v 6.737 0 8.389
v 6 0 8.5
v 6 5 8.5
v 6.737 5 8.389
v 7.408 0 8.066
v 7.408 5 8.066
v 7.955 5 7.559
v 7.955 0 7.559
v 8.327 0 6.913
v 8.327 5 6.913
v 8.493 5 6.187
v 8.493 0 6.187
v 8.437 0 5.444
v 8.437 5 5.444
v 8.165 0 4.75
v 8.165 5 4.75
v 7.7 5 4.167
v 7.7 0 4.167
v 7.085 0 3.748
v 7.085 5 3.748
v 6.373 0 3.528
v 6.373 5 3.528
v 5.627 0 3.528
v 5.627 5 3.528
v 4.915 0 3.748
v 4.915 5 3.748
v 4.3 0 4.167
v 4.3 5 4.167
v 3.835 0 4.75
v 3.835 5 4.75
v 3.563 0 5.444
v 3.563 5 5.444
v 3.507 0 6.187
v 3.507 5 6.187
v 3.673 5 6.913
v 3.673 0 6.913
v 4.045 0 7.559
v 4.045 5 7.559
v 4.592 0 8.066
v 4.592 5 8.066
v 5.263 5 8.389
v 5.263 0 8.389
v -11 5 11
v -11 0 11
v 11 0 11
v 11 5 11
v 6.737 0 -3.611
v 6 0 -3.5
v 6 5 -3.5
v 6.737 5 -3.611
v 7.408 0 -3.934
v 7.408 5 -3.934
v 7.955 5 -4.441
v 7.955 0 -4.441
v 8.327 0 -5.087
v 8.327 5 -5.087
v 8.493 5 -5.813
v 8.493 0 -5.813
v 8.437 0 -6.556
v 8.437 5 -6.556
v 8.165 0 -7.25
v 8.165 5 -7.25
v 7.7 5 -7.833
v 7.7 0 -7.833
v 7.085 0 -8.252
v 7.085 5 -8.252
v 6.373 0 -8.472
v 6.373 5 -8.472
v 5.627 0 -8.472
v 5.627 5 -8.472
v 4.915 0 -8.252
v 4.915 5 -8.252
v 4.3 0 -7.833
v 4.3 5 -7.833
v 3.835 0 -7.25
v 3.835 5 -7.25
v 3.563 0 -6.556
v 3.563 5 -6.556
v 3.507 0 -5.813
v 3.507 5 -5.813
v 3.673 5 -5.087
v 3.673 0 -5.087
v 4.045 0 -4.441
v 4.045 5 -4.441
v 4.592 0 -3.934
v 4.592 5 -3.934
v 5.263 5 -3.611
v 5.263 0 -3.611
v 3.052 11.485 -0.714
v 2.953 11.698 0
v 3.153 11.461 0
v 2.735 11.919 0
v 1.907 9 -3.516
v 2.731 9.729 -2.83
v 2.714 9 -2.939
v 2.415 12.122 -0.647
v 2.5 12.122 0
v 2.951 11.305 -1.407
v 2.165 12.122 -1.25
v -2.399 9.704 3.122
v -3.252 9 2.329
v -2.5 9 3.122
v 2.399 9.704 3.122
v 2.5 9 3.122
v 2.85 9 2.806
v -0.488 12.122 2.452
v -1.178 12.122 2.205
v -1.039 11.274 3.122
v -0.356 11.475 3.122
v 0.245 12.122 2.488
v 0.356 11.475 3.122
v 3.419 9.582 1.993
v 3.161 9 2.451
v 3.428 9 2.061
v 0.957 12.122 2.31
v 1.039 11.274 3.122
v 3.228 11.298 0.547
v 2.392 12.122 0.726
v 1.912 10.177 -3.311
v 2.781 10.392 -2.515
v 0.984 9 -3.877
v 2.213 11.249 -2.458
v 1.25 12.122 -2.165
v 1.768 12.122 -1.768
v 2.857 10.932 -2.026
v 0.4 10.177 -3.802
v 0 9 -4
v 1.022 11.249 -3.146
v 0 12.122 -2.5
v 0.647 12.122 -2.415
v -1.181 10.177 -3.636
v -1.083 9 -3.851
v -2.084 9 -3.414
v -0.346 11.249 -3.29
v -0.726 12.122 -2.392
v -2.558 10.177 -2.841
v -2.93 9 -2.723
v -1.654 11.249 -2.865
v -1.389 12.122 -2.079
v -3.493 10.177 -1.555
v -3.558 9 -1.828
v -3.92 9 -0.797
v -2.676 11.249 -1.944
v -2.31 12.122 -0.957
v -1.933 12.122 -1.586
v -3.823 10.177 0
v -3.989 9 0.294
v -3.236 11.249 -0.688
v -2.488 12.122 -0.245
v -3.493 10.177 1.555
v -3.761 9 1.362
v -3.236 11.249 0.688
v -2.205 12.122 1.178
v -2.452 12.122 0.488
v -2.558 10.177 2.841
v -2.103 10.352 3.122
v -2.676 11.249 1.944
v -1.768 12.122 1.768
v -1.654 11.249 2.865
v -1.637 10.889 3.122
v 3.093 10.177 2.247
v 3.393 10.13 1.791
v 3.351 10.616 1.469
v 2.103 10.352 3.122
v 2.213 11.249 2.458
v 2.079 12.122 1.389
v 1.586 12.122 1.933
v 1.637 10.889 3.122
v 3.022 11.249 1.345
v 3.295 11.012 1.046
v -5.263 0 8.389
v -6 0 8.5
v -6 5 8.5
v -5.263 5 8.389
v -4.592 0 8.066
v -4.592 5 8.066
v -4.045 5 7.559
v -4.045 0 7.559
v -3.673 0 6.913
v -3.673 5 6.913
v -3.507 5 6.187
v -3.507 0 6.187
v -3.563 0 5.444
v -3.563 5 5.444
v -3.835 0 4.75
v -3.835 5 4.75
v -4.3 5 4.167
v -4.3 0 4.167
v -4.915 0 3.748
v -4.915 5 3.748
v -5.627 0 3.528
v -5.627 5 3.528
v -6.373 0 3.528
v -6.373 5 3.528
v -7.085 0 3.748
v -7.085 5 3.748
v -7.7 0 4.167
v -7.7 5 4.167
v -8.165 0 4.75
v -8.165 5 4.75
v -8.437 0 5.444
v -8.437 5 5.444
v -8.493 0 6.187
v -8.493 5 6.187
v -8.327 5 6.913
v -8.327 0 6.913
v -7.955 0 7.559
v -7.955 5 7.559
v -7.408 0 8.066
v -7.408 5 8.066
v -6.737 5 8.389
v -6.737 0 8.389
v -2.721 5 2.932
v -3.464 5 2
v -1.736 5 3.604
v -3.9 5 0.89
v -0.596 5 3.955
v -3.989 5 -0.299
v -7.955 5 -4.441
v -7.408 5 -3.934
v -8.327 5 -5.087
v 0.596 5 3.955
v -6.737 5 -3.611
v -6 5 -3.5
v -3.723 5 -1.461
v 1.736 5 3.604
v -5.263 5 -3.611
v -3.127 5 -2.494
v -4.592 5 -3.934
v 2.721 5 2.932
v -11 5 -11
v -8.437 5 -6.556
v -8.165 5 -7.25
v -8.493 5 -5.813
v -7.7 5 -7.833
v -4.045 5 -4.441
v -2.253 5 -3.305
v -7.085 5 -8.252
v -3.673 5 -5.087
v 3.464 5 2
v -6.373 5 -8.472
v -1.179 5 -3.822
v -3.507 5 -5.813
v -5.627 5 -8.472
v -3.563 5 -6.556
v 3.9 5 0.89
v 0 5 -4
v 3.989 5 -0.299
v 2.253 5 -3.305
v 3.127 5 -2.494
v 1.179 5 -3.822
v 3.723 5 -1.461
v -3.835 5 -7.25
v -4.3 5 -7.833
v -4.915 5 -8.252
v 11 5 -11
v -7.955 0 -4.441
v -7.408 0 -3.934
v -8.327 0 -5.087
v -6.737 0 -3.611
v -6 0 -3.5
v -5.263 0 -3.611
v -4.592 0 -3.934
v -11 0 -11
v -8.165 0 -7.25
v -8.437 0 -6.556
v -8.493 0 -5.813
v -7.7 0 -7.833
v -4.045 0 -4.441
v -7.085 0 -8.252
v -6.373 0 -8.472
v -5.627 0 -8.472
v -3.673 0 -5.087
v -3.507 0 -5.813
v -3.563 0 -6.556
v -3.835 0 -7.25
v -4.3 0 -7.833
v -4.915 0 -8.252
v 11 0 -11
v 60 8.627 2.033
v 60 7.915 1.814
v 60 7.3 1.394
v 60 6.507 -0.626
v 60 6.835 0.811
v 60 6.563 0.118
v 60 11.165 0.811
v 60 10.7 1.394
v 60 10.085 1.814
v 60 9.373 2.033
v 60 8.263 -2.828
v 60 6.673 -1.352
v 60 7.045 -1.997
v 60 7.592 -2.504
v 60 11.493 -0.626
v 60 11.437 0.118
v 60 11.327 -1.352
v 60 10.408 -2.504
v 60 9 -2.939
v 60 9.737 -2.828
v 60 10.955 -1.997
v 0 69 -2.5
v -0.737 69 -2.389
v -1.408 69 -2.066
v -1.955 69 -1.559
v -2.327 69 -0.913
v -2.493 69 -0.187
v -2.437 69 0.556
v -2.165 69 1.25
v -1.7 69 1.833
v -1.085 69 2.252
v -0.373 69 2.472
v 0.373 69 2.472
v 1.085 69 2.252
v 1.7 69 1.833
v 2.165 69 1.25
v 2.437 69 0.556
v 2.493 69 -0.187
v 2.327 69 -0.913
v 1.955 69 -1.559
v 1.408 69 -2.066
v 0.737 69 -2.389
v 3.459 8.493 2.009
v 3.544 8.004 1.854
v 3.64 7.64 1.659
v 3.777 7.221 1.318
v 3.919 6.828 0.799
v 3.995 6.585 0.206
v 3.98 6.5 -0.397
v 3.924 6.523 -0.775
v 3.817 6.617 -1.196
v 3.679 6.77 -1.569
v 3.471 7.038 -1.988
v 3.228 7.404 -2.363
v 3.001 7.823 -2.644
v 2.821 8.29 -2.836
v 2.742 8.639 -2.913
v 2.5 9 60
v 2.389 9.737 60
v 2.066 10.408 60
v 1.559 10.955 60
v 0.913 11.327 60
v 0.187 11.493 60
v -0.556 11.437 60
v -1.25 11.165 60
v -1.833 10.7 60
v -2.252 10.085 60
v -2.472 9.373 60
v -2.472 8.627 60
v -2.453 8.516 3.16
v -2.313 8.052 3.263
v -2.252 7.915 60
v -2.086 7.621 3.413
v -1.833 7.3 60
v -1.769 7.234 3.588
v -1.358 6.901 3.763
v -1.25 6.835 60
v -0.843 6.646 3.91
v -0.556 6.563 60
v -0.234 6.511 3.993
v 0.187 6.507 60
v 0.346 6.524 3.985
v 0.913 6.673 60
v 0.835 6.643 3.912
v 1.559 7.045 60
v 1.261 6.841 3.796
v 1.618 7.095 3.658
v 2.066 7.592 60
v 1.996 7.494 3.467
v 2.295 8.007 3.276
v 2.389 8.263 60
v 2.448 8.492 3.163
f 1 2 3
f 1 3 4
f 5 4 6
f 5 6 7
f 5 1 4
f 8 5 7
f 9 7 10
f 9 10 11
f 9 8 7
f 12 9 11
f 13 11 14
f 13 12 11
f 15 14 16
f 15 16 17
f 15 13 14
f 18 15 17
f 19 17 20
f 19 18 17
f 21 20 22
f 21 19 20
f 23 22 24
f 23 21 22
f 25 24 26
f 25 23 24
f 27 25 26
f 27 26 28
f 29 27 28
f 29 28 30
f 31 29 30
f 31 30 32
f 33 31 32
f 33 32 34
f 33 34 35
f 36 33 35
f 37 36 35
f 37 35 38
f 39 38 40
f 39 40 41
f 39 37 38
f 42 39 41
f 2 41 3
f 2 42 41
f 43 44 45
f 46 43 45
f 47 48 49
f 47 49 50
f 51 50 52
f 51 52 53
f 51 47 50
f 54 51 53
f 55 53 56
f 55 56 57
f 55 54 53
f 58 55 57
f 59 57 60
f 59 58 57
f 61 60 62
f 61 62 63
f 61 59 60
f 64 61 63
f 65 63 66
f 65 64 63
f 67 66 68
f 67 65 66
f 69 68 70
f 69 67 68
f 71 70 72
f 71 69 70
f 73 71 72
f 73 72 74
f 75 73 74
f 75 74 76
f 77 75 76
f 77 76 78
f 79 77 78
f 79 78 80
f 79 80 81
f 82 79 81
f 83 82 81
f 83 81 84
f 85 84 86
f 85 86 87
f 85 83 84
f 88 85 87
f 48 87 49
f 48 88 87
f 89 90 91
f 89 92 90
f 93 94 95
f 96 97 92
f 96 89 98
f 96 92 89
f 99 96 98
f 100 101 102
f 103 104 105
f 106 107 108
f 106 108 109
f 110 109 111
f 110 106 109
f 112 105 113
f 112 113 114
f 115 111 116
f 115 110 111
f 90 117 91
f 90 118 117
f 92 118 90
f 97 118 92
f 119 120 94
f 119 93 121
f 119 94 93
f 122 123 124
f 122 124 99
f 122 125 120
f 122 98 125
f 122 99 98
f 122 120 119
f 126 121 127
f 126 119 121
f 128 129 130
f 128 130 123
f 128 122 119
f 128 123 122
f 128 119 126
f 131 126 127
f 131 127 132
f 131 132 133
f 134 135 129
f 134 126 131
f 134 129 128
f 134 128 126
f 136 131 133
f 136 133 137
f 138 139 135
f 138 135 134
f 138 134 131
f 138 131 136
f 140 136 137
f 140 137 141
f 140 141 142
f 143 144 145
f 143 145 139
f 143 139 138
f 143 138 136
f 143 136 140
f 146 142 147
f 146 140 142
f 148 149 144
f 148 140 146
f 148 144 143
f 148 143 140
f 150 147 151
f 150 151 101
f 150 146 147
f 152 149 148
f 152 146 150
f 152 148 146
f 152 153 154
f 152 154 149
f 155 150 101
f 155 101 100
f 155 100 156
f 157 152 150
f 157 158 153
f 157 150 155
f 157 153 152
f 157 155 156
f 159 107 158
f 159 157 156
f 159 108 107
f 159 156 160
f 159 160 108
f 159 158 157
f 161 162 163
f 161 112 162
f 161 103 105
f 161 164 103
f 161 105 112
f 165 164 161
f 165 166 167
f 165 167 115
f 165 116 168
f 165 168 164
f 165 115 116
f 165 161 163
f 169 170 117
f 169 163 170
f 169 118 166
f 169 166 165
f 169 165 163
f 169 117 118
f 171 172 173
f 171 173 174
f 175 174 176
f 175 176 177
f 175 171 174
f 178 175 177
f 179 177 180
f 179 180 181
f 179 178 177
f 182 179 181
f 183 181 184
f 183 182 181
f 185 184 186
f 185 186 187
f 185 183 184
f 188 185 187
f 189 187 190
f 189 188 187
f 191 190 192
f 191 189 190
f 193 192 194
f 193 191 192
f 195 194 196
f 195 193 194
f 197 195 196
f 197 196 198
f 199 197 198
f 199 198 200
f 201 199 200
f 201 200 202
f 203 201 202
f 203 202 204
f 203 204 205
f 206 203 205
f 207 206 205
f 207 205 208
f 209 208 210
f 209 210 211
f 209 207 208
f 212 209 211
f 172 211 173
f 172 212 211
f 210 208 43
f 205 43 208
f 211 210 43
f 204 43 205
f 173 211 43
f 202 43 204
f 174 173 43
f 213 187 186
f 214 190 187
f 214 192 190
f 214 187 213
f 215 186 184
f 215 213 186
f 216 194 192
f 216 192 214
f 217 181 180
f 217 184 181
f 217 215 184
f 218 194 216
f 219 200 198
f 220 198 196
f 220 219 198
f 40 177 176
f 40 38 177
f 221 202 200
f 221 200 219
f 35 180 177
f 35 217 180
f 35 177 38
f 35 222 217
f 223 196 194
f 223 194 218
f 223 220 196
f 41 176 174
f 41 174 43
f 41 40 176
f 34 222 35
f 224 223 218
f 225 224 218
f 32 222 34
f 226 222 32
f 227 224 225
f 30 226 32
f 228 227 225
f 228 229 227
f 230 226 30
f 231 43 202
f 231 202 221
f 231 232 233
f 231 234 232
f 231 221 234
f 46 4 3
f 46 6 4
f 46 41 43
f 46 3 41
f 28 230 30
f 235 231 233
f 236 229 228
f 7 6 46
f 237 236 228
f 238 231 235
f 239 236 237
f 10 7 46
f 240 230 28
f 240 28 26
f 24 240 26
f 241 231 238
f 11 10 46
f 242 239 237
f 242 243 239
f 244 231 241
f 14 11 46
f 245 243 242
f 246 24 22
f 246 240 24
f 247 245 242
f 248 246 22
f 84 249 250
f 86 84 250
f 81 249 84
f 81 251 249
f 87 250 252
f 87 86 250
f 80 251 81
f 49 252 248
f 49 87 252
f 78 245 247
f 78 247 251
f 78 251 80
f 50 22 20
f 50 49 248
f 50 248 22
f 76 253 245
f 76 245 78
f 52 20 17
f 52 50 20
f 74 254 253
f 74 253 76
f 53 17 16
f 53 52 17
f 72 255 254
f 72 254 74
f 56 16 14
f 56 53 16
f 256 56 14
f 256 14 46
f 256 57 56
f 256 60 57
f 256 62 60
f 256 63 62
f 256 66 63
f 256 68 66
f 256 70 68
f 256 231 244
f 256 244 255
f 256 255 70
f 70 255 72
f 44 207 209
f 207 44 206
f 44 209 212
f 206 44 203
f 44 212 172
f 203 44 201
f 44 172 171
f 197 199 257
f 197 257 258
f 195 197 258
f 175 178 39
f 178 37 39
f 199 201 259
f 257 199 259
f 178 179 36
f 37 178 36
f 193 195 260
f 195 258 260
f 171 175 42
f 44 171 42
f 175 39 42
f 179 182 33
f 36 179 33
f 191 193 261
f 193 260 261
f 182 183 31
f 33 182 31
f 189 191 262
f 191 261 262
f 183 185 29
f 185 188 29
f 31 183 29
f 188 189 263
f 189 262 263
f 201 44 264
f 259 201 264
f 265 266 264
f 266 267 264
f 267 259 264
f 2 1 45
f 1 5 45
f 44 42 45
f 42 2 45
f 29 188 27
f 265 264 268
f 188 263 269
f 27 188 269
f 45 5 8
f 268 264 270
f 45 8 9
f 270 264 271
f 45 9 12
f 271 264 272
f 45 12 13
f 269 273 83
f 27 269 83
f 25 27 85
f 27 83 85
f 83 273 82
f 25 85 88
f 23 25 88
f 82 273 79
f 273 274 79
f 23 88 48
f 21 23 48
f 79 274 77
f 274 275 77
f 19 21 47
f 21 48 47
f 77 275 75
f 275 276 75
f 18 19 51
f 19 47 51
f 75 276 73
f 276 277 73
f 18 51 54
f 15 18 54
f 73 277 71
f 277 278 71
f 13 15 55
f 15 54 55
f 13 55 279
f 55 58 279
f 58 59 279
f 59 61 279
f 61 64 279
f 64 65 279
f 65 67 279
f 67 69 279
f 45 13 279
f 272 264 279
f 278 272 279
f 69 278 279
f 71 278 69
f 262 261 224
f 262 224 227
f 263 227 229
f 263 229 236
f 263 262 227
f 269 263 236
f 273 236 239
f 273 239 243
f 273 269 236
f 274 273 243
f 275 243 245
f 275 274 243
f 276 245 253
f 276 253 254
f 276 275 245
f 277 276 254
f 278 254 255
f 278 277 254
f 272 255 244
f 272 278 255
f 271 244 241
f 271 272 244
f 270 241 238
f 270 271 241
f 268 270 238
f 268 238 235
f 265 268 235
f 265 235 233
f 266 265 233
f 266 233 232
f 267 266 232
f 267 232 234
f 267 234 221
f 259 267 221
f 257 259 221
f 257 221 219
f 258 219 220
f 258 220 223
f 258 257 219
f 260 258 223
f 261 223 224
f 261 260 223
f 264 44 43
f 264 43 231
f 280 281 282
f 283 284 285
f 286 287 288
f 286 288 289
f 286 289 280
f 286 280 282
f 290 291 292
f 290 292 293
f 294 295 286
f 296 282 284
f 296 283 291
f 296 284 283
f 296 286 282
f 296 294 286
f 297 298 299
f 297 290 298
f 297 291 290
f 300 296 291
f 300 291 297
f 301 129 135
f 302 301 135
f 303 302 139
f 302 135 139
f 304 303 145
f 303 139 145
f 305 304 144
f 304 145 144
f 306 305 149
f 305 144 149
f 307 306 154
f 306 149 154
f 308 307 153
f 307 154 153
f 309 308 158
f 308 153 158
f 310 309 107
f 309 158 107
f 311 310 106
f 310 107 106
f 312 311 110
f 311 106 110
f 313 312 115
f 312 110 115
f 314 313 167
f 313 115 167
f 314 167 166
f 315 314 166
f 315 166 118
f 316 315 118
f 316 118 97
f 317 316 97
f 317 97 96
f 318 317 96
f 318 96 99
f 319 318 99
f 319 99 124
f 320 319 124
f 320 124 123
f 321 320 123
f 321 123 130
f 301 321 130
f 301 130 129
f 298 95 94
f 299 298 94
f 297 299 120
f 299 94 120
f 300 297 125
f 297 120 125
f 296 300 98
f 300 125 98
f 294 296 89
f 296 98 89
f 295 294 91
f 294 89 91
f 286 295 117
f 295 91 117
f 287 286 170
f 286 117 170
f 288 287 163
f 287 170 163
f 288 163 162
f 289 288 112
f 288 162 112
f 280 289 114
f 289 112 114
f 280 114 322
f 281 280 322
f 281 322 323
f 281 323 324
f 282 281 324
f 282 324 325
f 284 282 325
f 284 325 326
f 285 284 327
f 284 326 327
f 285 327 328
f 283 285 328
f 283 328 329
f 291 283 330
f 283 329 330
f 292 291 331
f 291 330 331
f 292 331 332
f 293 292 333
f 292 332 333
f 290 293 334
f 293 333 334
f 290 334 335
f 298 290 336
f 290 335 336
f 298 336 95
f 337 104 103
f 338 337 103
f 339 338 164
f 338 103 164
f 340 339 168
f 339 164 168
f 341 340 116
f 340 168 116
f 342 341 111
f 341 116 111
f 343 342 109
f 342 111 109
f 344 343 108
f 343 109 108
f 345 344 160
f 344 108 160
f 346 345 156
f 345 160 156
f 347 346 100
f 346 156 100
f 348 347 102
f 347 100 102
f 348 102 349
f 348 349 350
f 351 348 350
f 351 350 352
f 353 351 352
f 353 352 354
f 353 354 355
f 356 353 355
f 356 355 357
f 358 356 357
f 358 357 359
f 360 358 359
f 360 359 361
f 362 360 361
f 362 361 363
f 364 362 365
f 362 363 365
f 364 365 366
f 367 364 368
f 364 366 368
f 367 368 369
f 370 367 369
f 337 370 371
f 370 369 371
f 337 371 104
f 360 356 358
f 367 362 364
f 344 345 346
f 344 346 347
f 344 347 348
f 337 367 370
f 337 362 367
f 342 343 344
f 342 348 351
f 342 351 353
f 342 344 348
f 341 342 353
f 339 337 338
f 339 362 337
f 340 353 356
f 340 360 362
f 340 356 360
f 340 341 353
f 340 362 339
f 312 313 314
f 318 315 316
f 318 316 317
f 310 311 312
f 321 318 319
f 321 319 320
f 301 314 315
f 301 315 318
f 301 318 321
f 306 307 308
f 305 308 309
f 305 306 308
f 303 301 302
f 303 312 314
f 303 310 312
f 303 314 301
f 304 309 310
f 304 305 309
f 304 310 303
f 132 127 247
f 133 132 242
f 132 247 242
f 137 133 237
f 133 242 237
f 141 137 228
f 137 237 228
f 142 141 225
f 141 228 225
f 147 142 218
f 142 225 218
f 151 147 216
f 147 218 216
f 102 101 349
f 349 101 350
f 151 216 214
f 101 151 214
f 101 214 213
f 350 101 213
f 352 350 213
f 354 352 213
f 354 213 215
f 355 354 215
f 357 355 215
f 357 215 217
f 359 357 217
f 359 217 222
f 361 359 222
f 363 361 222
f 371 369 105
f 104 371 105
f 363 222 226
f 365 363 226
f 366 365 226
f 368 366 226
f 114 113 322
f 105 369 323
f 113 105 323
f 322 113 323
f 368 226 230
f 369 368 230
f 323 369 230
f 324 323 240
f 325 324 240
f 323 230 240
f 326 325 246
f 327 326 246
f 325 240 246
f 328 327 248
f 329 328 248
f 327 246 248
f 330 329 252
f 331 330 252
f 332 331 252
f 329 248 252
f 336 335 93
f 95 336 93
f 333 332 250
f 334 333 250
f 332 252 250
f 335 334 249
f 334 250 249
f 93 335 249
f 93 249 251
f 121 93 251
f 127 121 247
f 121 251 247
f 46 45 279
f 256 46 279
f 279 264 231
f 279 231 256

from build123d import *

# Parameters (mm, degrees)
SKETCH_1_W      = 22
SKETCH_1_H      = 22
SKETCH_1_R      = 2.5
EXTRUDE_2_DEPTH = 5
EXTRUDE_START   = 5
SKETCH_3_R      = 4
EXTRUDE_3_DEPTH = 4
SKETCH_5_R      = 2.5
EXTRUDE_4_DEPTH = 64
SKETCH_6_R      = 2.5
EXTRUDE_5_DEPTH = 60
SKETCH_7_R      = 2.5
EXTRUDE_6_DEPTH = 60


with BuildPart() as part:
    # 草图1 → 凸台-拉伸2 (new body)
    with BuildSketch(Plane(origin=(0, 0, 0), x_dir=(1, 0, 0), z_dir=(0, 1, 0))):
        Rectangle(SKETCH_1_W, SKETCH_1_H)
        with Locations(Location((-6, 6, 0), (0, 0, 270))):
            Circle(SKETCH_1_R, mode=Mode.SUBTRACT)
        with Locations(Location((6, 6, 0), (0, 0, 270))):
            Circle(SKETCH_1_R, mode=Mode.SUBTRACT)
        with Locations(Location((-6, -6, 0), (0, 0, 270))):
            Circle(SKETCH_1_R, mode=Mode.SUBTRACT)
        with Locations(Location((6, -6, 0), (0, 0, 270))):
            Circle(SKETCH_1_R, mode=Mode.SUBTRACT)
    extrude(amount=EXTRUDE_2_DEPTH)

    # 草图3 → 凸台-拉伸3 (add)
    with BuildSketch(Plane(origin=(0, 0, 0), x_dir=(1, 0, 0), z_dir=(0, 1, 0)).offset(EXTRUDE_START)):
        with Locations(Location((0, 0, 0), (0, 0, 90))):
            Circle(SKETCH_3_R)
    extrude(amount=EXTRUDE_3_DEPTH)

    # 草图4 → 旋转1 (revolve)
    with BuildSketch(Plane.XY):
        with BuildLine():
            Line((0, 13), (0, 5))
            ThreePointArc((0, 5), (4, 9), (0, 13))
        make_face()
    revolve(axis=Axis((0, -1000, 0), (0, 1, 0)))

    # 草图5 → 凸台-拉伸4 (add)
    with BuildSketch(Plane(origin=(0, 0, 0), x_dir=(1, 0, 0), z_dir=(0, 1, 0)).offset(EXTRUDE_START)):
        with Locations(Location((0, 0, 0), (0, 0, 90))):
            Circle(SKETCH_5_R)
    extrude(amount=EXTRUDE_4_DEPTH)

    # 草图6 → 凸台-拉伸5 (add)
    with BuildSketch(Plane.XY):
        with Locations((0, 9)):
            Circle(SKETCH_6_R)
    extrude(amount=EXTRUDE_5_DEPTH)

    # 草图7 → 凸台-拉伸6 (add)
    with BuildSketch(Plane(origin=(0, 0, 0), x_dir=(0, 0, -1), z_dir=(1, 0, 0))):
        with Locations((0.4387505, 9)):
            Circle(SKETCH_7_R)
    extrude(amount=EXTRUDE_6_DEPTH)


solid = part.part
